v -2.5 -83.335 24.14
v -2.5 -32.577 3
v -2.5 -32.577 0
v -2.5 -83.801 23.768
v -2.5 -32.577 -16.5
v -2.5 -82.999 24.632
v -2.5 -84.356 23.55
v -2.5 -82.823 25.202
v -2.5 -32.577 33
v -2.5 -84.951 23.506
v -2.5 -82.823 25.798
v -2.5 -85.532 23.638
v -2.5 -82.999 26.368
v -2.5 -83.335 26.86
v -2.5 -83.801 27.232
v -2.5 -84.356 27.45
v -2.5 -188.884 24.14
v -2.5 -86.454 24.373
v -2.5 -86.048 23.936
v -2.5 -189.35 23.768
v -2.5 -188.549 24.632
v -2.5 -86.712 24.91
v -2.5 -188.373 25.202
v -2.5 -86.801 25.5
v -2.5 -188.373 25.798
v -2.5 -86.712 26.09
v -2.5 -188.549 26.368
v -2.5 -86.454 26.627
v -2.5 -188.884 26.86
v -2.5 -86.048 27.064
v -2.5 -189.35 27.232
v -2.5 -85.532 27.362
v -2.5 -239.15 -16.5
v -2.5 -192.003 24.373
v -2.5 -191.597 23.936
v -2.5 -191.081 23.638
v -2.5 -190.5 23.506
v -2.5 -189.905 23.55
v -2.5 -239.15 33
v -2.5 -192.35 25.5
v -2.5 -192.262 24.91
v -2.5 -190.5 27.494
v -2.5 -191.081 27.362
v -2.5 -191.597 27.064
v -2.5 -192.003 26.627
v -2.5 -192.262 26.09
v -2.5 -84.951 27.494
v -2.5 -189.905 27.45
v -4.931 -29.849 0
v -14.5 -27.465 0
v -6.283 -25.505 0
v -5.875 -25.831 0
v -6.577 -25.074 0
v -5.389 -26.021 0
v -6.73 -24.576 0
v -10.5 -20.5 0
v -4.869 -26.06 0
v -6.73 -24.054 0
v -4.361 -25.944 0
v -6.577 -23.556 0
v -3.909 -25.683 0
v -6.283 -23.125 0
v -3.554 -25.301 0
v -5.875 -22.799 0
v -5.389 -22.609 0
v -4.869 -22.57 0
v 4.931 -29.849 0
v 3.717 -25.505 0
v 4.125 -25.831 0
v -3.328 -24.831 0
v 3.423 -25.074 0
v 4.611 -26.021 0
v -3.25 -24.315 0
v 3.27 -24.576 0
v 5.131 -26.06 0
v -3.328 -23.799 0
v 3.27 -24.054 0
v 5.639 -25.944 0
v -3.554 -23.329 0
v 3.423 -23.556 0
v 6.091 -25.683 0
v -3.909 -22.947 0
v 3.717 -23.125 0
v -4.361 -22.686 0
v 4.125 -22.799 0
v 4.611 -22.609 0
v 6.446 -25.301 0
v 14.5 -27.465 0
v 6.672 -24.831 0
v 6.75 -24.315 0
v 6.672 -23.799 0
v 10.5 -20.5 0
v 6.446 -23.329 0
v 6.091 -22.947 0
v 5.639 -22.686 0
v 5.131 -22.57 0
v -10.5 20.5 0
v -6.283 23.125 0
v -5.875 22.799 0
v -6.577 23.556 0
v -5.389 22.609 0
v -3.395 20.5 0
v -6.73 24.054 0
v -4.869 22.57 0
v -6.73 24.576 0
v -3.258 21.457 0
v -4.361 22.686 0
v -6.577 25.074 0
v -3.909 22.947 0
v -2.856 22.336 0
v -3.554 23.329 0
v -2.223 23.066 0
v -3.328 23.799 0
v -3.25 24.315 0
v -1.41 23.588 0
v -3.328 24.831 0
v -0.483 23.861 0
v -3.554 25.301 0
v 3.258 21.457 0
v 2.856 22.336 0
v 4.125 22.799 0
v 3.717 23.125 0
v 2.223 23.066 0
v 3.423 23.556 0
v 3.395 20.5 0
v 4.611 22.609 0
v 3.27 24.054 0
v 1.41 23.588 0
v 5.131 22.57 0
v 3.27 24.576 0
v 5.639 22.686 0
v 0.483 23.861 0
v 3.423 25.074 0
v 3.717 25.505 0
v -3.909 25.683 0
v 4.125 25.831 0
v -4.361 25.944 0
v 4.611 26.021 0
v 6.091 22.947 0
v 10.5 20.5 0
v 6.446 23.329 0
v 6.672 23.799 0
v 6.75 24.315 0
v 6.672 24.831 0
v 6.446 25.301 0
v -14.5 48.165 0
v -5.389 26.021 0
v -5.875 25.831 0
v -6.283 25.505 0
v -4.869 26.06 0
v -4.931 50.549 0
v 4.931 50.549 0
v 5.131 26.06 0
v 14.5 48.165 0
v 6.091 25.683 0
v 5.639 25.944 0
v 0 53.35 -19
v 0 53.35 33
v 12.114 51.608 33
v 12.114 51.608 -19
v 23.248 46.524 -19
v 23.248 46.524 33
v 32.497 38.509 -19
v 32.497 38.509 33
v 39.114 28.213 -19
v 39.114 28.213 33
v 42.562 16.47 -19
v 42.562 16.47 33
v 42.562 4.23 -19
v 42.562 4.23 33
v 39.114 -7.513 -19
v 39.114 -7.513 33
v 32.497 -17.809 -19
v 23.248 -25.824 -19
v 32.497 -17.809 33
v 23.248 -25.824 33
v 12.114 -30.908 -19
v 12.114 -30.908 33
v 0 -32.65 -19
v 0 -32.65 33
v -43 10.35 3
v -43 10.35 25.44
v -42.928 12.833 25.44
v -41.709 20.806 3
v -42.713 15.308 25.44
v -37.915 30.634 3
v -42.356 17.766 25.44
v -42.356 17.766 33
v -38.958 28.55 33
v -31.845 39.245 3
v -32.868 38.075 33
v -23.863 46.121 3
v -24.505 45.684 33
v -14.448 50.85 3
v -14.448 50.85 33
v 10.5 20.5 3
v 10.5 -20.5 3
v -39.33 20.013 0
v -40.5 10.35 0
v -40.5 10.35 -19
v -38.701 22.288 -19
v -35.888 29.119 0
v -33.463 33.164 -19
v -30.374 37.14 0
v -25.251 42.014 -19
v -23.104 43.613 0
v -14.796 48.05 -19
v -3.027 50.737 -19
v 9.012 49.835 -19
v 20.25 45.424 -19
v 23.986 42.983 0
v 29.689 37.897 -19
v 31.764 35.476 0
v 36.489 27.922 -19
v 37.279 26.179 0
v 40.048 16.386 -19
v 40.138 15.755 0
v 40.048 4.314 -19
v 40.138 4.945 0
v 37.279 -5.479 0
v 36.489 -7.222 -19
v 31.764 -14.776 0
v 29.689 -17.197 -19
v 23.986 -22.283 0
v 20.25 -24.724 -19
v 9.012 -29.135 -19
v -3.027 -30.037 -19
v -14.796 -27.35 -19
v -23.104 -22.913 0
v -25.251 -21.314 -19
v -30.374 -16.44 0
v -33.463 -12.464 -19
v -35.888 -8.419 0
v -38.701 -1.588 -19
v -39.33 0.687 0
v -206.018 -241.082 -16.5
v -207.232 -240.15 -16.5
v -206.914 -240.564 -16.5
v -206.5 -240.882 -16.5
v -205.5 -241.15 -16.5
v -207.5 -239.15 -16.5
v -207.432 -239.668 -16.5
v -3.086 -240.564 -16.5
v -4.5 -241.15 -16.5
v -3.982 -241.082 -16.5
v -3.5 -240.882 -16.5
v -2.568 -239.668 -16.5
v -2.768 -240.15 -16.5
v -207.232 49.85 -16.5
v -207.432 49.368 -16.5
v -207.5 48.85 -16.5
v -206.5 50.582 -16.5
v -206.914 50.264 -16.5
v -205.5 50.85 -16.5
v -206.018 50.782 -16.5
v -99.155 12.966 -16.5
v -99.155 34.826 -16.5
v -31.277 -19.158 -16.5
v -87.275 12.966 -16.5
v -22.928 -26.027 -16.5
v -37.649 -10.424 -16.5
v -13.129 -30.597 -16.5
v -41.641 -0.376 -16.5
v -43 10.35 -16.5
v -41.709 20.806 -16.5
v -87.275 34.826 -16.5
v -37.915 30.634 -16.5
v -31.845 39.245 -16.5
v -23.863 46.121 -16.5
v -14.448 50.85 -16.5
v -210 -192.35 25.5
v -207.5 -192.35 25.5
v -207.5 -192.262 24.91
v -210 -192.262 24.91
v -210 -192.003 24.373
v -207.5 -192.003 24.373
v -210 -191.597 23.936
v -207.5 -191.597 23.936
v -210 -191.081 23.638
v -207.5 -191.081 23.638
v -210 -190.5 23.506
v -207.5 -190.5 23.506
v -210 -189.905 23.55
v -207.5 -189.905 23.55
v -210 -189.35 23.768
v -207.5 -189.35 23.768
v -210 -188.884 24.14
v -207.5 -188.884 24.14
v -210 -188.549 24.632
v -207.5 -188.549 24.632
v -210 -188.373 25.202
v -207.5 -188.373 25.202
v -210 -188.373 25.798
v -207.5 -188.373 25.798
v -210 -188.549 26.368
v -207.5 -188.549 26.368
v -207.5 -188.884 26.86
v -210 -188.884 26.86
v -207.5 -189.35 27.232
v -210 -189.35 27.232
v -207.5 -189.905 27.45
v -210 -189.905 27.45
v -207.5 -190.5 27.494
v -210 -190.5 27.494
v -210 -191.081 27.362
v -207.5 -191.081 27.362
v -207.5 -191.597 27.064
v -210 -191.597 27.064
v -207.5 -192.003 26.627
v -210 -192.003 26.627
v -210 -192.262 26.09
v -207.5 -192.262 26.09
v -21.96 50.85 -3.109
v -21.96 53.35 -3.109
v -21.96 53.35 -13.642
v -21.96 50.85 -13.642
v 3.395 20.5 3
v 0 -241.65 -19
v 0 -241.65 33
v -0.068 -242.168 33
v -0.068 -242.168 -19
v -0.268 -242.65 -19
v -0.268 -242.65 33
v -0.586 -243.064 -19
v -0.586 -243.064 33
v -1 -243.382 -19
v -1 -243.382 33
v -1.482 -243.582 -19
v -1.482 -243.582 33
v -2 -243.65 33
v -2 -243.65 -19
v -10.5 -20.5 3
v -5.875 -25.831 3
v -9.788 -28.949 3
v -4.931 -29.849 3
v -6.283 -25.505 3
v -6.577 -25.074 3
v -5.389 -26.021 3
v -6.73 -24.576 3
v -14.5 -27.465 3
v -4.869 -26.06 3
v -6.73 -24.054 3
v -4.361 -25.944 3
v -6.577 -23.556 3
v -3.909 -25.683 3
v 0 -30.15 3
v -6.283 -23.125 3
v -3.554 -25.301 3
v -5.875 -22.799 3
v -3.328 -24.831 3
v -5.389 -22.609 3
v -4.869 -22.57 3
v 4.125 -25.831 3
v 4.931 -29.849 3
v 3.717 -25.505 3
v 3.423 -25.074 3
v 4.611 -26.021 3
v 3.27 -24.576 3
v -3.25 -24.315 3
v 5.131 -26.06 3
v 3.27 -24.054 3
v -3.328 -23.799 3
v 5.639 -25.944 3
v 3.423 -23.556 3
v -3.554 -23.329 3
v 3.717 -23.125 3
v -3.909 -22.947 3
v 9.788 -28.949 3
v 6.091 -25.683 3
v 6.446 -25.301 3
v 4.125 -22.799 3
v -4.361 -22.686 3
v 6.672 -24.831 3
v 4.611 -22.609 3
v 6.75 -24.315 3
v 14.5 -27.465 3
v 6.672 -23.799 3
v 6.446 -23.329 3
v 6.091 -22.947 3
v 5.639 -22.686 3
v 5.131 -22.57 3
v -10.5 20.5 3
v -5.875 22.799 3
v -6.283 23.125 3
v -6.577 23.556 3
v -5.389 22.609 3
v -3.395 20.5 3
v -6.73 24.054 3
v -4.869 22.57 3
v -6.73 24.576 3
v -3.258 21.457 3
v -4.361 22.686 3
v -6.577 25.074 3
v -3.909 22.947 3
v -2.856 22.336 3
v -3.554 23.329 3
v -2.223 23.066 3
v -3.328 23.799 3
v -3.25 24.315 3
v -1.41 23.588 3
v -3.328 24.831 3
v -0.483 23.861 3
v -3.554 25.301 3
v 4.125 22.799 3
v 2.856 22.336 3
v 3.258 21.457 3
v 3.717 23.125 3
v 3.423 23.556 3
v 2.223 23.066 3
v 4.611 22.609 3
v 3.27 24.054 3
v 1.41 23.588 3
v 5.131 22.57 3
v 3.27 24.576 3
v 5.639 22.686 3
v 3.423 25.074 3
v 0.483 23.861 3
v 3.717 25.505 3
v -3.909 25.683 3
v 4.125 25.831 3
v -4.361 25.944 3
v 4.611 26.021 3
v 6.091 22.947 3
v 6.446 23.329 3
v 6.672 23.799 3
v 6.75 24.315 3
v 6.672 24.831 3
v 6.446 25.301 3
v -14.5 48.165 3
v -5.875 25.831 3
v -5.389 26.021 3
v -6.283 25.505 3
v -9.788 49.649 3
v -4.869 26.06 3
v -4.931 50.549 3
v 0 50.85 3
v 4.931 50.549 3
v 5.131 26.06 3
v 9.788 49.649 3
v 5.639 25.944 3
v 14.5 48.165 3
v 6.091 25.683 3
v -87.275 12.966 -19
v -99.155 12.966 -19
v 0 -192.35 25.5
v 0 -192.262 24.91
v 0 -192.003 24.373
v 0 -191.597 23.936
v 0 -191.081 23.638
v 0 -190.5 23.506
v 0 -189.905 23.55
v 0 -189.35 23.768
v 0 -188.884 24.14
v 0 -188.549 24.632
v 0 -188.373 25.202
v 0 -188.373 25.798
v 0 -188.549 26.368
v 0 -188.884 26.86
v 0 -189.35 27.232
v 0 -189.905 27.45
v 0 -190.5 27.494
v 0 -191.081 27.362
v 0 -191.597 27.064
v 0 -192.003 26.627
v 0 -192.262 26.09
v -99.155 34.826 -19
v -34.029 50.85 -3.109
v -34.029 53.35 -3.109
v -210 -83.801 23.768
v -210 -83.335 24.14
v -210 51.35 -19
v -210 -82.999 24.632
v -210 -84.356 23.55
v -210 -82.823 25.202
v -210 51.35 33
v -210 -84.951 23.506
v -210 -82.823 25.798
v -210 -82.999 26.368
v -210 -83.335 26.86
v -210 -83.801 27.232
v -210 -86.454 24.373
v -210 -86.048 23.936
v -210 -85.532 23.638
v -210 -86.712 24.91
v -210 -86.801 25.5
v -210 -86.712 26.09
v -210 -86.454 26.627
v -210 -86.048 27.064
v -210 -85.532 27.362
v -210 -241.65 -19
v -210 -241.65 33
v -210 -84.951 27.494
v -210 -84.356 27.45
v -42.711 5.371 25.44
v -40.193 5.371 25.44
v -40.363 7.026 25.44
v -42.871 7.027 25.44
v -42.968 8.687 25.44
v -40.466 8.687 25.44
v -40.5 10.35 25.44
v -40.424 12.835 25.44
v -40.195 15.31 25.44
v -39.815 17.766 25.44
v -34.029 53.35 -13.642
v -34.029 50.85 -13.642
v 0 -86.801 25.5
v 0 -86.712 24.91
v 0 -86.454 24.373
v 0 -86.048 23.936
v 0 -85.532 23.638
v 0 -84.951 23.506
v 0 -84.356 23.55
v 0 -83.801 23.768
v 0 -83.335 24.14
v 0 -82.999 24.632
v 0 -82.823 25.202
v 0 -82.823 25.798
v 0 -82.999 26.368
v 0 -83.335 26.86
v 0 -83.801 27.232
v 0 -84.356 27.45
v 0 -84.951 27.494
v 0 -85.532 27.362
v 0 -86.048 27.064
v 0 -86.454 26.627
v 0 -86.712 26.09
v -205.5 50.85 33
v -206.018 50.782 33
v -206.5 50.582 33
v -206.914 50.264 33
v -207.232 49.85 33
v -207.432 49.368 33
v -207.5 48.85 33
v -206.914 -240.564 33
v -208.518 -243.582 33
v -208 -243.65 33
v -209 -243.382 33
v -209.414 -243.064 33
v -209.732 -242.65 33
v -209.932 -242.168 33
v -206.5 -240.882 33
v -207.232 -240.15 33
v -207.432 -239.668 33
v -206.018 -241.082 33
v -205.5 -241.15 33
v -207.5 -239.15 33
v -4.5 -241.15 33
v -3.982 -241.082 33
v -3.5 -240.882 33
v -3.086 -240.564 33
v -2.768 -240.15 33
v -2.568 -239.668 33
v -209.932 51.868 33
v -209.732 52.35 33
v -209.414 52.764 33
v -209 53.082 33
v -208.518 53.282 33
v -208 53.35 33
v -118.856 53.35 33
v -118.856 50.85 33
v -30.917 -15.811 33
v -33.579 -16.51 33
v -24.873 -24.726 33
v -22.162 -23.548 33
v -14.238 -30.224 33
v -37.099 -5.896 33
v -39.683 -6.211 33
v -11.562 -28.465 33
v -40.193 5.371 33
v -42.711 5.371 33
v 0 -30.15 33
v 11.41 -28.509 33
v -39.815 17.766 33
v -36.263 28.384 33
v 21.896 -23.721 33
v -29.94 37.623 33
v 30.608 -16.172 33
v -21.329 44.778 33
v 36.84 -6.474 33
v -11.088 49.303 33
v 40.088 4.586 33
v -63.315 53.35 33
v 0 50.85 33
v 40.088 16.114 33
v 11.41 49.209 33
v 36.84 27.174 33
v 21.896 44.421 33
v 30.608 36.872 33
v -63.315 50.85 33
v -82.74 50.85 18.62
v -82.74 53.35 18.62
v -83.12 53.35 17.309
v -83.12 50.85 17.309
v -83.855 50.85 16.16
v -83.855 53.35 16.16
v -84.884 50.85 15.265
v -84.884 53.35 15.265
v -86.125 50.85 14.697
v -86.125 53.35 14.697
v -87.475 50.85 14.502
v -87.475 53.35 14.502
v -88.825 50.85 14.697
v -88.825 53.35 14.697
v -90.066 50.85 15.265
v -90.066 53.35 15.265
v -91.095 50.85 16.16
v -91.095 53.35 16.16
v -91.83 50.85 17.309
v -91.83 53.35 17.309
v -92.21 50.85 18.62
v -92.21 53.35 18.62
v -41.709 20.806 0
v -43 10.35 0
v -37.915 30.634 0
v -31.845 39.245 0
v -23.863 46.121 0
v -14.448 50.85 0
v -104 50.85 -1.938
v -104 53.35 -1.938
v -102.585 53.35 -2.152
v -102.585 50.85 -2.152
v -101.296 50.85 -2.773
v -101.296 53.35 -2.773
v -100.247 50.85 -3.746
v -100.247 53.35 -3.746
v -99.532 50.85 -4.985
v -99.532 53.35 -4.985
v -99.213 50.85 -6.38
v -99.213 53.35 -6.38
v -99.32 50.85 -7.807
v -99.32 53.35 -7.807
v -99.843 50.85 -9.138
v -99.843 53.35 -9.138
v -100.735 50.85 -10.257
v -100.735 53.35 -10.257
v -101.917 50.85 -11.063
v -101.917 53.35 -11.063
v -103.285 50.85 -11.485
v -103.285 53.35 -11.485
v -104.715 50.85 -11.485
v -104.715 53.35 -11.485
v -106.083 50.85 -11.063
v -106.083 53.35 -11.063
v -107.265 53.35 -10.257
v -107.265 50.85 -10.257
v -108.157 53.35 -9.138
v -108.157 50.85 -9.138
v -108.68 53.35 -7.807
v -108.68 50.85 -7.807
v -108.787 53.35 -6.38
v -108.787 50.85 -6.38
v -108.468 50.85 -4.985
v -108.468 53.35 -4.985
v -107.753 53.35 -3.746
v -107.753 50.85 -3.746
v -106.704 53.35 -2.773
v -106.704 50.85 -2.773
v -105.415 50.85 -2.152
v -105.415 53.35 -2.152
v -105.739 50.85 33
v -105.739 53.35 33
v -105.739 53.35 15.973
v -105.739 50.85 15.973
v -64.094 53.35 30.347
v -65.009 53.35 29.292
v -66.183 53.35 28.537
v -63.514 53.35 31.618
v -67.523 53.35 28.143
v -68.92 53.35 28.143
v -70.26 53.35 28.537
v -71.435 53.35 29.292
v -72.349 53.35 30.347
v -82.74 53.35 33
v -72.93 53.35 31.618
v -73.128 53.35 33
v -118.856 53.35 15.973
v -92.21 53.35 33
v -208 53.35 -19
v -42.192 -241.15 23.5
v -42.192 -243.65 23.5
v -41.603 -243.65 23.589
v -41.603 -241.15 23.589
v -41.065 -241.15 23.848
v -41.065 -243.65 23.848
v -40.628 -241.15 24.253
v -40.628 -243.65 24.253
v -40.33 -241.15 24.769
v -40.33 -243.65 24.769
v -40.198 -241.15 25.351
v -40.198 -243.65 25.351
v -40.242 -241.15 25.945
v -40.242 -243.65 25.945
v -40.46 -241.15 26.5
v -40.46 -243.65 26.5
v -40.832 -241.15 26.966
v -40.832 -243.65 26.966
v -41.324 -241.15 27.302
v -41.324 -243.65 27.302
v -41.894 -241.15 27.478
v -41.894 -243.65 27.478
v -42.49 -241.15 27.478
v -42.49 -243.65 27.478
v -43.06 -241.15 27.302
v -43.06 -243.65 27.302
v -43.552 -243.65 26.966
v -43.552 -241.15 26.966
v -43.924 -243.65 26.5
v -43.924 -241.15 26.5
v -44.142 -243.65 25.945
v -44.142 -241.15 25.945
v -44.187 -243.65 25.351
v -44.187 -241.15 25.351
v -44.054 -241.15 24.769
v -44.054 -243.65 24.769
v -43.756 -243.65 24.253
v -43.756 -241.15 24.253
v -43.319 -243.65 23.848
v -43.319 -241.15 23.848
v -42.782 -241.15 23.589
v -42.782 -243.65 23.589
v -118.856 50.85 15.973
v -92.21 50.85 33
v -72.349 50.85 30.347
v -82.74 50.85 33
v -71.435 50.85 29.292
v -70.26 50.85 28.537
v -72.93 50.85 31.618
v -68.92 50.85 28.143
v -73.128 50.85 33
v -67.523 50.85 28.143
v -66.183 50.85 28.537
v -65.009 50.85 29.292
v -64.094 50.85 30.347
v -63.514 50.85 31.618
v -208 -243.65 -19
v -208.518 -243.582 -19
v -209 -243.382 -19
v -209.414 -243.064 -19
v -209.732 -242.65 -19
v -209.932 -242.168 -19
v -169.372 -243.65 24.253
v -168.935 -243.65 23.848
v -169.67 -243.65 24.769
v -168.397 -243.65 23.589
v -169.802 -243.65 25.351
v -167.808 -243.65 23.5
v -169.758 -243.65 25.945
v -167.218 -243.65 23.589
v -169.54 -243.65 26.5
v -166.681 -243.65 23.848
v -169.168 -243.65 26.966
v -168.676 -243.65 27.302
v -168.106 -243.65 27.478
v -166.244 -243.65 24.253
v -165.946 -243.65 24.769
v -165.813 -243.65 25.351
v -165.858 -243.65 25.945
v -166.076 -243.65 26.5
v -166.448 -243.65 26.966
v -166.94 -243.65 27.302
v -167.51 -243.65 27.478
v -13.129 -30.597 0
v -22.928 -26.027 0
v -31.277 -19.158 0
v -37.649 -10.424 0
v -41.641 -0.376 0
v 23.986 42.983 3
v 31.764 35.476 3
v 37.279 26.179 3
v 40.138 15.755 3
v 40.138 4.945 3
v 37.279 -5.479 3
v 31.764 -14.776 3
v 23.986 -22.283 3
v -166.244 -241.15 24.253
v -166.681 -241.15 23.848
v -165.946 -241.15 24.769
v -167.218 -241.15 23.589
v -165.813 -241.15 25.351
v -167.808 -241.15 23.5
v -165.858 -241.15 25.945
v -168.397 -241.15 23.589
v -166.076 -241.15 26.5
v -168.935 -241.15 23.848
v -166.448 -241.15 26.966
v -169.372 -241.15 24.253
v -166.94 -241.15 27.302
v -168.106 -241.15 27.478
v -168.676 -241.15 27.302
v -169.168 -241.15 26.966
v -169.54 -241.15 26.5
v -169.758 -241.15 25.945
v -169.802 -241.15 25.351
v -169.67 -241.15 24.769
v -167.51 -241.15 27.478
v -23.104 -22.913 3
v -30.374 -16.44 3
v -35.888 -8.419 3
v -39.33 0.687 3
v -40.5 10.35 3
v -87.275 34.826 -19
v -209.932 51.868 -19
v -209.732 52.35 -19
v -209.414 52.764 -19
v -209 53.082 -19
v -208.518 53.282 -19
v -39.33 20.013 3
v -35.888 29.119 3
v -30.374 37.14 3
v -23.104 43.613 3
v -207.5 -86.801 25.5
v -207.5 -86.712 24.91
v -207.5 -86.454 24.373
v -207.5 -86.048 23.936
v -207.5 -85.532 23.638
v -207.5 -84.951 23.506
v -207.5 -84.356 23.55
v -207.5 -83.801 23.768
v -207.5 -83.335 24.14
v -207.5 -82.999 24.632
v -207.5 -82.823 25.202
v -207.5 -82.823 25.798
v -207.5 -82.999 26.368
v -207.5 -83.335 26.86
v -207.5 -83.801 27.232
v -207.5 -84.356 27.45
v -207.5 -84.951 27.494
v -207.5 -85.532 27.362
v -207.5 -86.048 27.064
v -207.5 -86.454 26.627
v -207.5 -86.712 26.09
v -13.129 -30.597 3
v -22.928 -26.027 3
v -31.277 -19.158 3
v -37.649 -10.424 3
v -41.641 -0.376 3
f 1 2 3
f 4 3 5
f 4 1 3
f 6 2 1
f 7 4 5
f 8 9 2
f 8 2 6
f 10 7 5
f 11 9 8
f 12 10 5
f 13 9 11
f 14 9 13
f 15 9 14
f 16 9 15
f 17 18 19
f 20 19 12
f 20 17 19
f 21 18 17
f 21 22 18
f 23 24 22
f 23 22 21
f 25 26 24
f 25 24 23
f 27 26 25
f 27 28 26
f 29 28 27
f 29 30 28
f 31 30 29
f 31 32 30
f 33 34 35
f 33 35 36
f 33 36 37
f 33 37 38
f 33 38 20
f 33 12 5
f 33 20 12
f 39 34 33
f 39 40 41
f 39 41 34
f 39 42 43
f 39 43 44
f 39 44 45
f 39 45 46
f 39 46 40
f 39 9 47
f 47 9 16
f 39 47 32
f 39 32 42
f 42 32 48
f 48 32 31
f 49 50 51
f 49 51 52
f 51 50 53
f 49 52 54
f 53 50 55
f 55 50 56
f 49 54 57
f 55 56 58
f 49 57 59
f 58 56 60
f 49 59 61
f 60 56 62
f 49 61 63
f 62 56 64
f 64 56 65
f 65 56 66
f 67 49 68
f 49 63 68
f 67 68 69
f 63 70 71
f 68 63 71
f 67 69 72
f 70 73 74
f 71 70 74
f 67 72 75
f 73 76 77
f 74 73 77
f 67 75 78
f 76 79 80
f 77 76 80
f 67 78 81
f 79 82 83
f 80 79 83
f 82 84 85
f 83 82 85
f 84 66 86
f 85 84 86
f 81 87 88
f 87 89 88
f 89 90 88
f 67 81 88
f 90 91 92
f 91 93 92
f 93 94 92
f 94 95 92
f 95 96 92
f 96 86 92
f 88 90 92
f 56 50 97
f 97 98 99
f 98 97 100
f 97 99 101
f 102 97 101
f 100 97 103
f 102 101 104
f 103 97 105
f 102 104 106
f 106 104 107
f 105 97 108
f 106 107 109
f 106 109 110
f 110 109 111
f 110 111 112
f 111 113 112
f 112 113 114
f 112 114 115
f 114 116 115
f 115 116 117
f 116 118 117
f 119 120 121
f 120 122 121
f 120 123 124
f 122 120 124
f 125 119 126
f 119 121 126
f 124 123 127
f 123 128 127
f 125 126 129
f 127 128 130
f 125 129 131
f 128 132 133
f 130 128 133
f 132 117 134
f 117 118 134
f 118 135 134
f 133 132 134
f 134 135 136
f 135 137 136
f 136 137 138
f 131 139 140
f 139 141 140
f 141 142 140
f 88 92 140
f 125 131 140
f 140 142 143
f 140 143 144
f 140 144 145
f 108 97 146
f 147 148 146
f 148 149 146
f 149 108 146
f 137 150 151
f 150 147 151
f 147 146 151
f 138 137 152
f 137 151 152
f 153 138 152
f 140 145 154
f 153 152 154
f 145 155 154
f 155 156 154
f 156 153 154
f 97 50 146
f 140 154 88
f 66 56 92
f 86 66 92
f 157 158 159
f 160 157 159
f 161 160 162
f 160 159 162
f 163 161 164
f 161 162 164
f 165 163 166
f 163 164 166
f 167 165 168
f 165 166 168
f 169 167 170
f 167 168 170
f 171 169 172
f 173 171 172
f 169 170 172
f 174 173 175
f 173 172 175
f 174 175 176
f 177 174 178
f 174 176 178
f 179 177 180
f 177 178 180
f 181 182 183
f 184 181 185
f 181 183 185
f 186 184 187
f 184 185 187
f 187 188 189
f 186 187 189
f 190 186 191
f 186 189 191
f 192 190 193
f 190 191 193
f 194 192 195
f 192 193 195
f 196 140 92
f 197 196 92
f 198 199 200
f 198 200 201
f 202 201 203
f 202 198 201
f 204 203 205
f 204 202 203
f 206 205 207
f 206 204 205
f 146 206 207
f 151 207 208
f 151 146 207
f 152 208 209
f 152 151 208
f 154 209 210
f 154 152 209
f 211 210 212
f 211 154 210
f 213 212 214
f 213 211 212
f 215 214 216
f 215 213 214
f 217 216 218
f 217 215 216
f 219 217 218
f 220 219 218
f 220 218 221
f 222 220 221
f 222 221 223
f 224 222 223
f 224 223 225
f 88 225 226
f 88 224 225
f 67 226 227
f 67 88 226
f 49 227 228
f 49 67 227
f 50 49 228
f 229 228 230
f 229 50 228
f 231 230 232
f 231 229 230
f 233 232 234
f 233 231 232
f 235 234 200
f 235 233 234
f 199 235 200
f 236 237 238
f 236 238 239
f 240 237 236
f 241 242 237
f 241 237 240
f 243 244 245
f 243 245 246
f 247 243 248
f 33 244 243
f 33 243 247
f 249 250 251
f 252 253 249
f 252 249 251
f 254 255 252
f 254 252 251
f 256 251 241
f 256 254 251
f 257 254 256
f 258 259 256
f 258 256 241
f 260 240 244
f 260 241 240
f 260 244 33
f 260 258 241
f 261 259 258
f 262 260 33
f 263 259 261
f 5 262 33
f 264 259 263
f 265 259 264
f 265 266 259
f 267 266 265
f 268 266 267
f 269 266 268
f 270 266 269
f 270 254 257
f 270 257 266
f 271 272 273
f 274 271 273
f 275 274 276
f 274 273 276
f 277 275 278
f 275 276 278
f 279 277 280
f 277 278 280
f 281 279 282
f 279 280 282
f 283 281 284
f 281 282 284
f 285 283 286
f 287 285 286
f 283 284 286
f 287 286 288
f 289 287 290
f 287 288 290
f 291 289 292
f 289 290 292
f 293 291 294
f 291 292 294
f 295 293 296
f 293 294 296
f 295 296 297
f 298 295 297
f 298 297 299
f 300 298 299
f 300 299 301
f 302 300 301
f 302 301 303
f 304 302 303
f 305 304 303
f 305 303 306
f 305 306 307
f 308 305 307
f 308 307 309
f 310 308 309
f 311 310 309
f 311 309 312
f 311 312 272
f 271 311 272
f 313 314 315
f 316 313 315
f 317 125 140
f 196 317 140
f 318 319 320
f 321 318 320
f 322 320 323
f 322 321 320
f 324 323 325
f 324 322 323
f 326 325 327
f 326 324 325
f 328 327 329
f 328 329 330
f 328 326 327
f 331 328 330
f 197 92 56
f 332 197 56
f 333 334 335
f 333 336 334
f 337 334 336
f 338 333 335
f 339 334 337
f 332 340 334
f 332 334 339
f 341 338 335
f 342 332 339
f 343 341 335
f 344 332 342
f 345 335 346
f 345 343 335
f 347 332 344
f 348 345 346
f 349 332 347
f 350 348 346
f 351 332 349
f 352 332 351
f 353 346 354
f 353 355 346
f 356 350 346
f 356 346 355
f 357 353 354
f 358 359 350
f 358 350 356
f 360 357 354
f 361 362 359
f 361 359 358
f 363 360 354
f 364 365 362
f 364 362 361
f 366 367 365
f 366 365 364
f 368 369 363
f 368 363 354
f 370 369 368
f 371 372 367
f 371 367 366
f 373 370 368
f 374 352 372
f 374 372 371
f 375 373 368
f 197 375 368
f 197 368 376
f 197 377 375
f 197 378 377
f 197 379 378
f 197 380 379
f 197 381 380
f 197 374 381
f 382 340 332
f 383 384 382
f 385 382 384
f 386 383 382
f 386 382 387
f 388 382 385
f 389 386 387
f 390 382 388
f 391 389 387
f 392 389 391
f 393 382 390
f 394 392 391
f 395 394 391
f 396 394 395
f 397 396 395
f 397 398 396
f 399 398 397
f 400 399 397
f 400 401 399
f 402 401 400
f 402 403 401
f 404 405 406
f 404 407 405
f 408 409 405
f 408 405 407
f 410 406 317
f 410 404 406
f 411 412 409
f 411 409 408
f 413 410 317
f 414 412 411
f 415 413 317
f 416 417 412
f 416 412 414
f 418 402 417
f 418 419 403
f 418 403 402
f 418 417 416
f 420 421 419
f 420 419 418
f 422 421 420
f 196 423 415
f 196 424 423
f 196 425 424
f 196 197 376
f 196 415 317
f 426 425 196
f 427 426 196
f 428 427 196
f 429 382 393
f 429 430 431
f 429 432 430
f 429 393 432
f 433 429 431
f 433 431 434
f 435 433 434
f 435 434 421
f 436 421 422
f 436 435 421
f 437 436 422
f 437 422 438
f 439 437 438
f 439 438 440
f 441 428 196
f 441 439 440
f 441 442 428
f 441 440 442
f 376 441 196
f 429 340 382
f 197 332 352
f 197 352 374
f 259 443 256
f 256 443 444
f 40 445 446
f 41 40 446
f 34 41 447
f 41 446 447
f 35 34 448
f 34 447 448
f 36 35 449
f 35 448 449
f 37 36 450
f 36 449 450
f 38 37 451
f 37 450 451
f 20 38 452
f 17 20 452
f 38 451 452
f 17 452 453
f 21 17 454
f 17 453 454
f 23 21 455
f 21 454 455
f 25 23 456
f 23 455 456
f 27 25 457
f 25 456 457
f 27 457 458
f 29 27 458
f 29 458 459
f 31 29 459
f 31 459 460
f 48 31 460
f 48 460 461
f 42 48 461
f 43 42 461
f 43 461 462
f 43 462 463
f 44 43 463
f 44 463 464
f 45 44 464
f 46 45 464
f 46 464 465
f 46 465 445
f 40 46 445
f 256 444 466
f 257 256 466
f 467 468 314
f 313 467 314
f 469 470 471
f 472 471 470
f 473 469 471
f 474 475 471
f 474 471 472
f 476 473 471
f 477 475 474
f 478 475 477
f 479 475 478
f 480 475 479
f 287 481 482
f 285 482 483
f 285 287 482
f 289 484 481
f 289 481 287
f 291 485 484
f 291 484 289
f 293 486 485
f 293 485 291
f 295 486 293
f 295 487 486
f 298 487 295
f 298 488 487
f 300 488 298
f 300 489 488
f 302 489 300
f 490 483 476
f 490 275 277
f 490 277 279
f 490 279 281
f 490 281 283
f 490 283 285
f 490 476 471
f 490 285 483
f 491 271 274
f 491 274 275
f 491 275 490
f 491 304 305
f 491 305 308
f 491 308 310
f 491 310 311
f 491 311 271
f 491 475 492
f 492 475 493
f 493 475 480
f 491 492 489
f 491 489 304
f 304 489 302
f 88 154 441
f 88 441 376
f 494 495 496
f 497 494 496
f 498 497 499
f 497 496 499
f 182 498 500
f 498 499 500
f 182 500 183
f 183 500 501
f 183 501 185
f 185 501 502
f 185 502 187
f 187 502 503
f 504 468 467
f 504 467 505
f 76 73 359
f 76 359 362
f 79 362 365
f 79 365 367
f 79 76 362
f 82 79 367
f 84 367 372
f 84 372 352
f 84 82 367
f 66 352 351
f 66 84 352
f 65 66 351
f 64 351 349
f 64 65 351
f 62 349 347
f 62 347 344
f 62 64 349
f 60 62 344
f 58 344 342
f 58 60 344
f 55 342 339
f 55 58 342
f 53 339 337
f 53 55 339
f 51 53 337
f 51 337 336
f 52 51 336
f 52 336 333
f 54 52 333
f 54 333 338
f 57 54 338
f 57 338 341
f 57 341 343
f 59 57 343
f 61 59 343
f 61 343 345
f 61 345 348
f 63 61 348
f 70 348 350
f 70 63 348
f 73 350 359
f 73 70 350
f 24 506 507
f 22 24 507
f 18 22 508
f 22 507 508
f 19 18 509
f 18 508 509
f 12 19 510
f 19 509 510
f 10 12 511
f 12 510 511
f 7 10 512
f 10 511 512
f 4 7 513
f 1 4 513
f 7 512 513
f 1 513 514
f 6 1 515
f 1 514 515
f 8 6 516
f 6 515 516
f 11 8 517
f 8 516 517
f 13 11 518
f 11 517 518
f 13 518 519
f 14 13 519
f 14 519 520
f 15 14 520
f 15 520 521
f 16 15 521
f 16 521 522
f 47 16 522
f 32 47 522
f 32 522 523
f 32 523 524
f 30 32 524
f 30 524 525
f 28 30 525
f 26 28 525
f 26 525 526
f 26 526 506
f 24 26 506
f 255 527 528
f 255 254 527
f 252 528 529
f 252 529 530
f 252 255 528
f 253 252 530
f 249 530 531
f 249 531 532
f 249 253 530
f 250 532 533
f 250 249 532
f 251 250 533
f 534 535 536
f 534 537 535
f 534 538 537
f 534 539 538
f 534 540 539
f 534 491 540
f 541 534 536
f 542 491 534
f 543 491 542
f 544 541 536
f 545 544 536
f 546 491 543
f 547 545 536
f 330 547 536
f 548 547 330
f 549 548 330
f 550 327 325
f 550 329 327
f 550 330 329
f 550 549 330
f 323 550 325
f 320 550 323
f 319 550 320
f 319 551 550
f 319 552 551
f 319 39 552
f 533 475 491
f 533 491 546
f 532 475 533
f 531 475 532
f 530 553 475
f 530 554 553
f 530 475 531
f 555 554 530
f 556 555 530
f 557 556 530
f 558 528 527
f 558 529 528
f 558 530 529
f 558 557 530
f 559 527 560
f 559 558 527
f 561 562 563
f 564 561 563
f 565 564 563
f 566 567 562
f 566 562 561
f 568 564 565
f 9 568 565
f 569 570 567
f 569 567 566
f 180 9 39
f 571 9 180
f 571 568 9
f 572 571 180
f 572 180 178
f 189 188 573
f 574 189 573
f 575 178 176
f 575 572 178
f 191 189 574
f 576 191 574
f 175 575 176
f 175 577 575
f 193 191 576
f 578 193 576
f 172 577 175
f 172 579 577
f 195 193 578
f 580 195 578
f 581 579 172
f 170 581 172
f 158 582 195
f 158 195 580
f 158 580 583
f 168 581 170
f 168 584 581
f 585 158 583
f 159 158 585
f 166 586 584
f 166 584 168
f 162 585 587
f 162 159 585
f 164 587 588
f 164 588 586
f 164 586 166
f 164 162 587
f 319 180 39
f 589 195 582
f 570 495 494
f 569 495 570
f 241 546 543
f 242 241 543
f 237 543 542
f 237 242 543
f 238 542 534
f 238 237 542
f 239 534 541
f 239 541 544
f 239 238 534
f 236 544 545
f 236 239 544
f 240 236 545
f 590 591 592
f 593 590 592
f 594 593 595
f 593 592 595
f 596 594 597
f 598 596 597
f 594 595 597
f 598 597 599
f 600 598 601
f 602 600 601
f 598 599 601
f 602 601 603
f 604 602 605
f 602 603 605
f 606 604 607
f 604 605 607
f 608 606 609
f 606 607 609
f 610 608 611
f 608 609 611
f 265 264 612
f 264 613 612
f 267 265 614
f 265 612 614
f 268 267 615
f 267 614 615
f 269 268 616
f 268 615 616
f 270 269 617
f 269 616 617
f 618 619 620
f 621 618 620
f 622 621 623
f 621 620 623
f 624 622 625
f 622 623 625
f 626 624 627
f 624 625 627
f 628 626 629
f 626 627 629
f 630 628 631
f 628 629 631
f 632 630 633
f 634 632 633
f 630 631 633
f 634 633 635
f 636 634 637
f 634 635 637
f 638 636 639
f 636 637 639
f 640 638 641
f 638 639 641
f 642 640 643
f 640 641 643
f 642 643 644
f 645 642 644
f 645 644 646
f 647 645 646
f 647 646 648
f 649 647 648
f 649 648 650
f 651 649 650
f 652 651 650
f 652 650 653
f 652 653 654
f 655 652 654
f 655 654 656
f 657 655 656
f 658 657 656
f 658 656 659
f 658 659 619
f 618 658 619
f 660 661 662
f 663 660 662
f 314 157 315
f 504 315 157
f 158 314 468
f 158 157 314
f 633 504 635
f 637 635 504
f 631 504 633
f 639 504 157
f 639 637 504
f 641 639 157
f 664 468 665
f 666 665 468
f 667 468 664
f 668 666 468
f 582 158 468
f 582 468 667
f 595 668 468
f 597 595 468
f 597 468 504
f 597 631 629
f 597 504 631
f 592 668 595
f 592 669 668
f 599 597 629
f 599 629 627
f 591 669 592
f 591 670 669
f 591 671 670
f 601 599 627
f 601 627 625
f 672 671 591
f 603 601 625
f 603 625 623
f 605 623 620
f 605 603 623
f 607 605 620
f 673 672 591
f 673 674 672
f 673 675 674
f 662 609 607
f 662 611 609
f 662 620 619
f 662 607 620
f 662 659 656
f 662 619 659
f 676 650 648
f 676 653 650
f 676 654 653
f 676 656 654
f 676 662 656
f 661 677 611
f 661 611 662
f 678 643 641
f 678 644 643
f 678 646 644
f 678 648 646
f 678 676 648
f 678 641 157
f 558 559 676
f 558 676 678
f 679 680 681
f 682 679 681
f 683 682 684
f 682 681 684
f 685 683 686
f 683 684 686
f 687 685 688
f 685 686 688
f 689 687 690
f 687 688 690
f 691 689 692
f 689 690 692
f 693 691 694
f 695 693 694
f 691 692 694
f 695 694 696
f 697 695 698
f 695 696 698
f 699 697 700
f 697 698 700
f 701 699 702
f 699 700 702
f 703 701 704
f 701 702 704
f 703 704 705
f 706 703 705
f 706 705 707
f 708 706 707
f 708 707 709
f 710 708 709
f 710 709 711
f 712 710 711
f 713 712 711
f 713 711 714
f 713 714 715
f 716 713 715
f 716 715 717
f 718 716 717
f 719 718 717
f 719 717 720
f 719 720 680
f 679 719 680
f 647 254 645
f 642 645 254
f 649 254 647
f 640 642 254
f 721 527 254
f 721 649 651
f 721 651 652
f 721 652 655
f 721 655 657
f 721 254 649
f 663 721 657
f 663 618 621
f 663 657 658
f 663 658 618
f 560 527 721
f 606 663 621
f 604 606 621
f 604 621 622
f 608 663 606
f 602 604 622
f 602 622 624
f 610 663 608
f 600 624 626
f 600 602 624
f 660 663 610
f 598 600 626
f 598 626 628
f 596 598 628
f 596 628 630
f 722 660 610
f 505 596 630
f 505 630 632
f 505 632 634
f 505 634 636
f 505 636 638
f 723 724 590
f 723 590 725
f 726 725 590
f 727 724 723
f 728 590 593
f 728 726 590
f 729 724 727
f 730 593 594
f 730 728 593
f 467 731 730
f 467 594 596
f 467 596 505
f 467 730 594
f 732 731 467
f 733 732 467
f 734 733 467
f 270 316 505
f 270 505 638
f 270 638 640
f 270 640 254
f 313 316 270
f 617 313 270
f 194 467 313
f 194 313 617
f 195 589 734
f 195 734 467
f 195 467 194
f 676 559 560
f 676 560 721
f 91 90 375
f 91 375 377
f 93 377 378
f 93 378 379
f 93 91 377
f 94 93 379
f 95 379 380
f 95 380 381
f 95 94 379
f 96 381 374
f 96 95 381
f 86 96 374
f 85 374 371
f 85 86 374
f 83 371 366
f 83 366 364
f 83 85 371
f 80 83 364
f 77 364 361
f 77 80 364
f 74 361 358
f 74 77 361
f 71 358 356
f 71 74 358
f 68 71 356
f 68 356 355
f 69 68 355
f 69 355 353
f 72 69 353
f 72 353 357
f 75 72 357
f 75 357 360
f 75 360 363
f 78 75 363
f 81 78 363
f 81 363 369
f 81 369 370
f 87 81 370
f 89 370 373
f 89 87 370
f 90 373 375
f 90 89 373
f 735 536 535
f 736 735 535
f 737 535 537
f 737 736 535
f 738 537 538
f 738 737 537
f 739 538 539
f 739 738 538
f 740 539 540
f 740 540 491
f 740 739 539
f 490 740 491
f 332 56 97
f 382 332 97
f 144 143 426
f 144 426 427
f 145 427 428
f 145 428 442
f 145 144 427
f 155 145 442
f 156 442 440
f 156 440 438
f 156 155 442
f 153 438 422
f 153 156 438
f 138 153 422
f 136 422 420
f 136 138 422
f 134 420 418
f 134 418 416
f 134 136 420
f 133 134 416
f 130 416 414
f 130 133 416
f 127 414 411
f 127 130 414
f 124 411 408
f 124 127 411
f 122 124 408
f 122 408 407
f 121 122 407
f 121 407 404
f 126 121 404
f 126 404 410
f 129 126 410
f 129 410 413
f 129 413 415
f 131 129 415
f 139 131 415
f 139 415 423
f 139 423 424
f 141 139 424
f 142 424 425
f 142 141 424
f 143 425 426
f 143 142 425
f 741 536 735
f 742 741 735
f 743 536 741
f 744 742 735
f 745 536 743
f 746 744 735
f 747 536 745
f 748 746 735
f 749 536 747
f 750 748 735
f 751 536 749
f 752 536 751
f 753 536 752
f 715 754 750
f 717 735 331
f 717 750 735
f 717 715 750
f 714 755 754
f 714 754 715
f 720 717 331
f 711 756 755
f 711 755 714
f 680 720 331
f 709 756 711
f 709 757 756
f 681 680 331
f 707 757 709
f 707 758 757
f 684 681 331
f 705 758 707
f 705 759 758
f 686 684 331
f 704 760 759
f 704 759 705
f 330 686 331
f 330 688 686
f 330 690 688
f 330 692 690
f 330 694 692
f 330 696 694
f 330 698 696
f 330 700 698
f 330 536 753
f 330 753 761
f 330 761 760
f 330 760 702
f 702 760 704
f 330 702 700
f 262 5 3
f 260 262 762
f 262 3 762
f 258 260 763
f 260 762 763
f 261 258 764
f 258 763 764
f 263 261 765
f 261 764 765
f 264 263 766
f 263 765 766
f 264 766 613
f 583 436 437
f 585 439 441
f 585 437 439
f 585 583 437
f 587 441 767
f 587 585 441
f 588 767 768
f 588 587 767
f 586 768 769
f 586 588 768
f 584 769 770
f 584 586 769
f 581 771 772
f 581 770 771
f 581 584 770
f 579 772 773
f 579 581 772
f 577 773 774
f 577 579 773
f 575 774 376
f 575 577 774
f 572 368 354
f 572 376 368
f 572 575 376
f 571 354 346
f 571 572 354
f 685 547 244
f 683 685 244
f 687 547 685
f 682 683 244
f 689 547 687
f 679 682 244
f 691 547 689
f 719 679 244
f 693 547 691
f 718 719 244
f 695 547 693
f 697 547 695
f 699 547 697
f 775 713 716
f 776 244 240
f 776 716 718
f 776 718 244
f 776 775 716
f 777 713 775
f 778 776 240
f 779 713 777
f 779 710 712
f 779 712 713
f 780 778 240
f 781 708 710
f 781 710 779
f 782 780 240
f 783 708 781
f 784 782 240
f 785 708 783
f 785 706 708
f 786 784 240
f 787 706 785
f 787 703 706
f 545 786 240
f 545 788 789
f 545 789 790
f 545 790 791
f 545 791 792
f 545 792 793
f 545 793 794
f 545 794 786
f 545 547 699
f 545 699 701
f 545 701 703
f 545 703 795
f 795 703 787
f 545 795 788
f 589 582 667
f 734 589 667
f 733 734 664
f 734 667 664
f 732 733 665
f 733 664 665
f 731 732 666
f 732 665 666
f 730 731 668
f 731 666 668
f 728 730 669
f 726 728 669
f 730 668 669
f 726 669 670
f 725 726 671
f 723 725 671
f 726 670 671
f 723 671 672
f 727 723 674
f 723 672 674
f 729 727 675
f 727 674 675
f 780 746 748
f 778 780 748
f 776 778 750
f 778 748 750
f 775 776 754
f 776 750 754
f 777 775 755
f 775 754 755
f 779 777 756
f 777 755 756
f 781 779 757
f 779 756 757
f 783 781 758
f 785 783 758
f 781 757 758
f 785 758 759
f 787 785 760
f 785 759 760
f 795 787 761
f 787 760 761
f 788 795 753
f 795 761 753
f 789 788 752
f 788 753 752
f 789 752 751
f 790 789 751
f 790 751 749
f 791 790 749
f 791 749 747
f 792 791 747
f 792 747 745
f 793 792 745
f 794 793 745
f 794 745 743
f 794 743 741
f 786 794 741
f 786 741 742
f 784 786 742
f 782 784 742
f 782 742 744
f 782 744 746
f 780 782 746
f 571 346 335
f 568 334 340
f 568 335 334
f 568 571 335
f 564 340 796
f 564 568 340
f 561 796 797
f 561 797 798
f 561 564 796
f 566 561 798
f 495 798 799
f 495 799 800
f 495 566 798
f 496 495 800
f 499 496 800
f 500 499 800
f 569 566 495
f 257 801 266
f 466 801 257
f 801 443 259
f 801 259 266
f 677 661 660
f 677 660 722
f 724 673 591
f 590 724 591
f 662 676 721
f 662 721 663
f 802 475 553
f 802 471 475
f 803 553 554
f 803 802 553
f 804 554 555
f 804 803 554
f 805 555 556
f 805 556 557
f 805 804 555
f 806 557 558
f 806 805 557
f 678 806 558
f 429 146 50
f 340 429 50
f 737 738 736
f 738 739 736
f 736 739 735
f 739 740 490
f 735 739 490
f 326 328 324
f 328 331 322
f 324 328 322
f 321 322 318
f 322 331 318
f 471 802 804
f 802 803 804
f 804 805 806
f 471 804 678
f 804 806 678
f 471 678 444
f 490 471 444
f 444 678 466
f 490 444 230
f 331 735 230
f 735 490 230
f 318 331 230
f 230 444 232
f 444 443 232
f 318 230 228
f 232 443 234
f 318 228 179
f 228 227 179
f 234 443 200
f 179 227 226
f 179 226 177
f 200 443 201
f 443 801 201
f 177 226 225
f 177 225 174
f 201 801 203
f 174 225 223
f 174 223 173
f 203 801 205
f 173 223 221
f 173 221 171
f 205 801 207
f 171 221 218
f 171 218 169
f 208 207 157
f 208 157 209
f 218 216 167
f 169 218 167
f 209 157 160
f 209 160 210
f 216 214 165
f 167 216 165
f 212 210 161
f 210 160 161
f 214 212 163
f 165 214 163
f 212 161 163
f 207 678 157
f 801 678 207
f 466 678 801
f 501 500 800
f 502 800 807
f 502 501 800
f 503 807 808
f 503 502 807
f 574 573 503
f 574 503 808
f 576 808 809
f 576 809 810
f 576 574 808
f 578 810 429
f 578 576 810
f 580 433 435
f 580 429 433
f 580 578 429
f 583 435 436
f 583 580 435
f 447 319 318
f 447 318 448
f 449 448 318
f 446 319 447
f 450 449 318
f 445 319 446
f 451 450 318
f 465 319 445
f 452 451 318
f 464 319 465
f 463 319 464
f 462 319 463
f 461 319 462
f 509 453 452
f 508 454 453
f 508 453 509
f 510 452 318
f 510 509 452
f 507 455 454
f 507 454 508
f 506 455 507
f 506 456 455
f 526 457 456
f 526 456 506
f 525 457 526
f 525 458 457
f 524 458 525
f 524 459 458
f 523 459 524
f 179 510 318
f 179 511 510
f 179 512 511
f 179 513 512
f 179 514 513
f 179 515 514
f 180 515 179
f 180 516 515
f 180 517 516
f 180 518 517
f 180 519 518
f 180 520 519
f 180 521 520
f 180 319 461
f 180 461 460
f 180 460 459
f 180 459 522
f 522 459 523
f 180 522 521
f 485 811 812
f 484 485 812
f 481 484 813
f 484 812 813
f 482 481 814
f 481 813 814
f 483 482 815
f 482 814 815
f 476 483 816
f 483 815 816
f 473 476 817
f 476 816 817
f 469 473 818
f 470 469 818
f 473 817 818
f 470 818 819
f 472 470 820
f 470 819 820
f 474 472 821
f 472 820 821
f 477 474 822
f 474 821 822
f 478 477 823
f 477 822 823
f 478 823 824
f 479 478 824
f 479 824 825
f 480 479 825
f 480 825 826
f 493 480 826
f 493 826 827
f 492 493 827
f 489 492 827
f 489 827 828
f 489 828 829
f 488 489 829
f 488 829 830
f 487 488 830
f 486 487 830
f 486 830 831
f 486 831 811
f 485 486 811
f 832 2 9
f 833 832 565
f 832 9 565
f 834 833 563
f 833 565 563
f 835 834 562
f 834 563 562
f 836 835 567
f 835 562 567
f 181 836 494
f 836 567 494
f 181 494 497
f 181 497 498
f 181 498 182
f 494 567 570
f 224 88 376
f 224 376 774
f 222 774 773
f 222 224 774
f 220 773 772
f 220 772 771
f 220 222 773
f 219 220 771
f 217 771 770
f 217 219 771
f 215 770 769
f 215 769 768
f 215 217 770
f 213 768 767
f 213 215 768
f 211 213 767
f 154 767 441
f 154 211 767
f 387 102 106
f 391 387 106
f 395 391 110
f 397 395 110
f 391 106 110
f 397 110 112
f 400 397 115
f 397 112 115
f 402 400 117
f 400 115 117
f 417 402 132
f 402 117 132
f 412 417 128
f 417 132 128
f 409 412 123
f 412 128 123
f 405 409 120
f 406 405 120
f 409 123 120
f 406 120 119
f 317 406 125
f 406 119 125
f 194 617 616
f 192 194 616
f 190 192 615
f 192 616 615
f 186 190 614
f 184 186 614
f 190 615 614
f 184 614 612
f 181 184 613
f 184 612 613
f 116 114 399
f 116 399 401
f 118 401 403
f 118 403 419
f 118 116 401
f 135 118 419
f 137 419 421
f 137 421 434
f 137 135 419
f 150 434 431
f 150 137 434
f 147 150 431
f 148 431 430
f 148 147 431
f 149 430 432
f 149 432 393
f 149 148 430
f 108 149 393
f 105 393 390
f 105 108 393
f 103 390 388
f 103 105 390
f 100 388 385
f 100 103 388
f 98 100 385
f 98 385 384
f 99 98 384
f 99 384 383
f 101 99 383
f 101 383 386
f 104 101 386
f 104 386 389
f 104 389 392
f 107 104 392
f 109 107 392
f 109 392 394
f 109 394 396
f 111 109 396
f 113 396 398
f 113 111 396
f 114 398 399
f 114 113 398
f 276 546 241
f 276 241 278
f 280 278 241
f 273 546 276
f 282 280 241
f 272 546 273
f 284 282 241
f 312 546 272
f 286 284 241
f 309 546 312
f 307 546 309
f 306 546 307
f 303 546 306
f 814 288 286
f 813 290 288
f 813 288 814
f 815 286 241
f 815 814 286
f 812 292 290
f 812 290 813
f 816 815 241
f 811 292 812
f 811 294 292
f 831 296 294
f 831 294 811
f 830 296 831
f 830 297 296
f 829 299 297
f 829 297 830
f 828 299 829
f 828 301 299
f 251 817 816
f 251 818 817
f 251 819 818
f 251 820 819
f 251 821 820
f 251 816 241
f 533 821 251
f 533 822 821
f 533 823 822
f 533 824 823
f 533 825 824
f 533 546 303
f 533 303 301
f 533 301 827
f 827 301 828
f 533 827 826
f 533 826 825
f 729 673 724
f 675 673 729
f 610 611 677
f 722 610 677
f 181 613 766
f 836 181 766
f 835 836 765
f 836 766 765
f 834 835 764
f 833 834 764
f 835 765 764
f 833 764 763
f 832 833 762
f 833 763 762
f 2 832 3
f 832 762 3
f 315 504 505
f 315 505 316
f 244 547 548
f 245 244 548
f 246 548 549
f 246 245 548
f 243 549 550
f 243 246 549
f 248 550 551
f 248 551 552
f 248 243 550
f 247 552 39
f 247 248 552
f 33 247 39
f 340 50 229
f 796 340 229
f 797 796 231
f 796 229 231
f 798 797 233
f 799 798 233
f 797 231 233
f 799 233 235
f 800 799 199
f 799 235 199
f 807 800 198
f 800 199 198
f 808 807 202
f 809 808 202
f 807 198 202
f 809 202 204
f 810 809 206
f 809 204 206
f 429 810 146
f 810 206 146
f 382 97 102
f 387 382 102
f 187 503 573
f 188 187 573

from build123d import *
from build123d.topology import SkipClean

# Parameters (mm, degrees)
SKETCH_1_R             = 43
SKETCH_1_R_2           = 1.75
EXTRUDE_1_DEPTH        = 3
EXTRUDE_1_2_DEPTH      = 19
EXTRUDE_1_2_DEPTH_BACK = 33
SKETCH_3_R             = 43
SKETCH_3_R_2           = 40.5
EXTRUDE_START          = -52
EXTRUDE_2_DEPTH        = 52
EXTRUDE_2_2_DEPTH      = 2.5
FILLET_1_R             = 2
SKETCH_6_W             = 12.068691
SKETCH_6_H             = 10.532676
CUT_EXTRUDE_1_DEPTH    = 3
SKETCH_7_R             = 2
CUT_EXTRUDE_2_DEPTH    = 283
SKETCH_8_R             = 2
CUT_EXTRUDE_3_DEPTH    = 10
SKETCH_9_W             = 13.11693
SKETCH_9_H             = 19.719399
CUT_EXTRUDE_4_DEPTH    = 10
SKETCH_10_W            = 7.55958
SKETCH_10_H            = 12.395118
CUT_EXTRUDE_5_DEPTH    = 61
SKETCH_11_W            = 11.880057
SKETCH_11_H            = 21.859304
CUT_EXTRUDE_6_DEPTH    = 61
SKETCH_12_R            = 4.8
CUT_EXTRUDE_7_DEPTH    = 10
SKETCH_13_R            = 4.906551
CUT_EXTRUDE_8_DEPTH    = 10


with BuildPart() as part:
    # 草图1 → Extrude 1 (new body)
    with BuildSketch(Plane.XY):
        with Locations((0, 10.35)):
            Circle(SKETCH_1_R)
        with Locations((-5, 24.315)):
            Circle(SKETCH_1_R_2, mode=Mode.SUBTRACT)
        with Locations((5, 24.315)):
            Circle(SKETCH_1_R_2, mode=Mode.SUBTRACT)
        with Locations((-5, -24.315)):
            Circle(SKETCH_1_R_2, mode=Mode.SUBTRACT)
        with Locations((5, -24.315)):
            Circle(SKETCH_1_R_2, mode=Mode.SUBTRACT)
        with BuildLine():
            Line((3.395324, 20.5), (10.5, 20.5))
            Line((10.5, 20.5), (10.5, -20.5))
            Line((10.5, -20.5), (-10.5, -20.5))
            Line((-10.5, -20.5), (-10.5, 20.5))
            Line((-10.5, 20.5), (-3.395324, 20.5))
            ThreePointArc((-3.395324, 20.5), (0, 23.895324), (3.395324, 20.5))
        make_face(mode=Mode.SUBTRACT)
        with BuildLine():
            Line((-14.5, 48.165341), (-14.5, -27.465341))
            ThreePointArc((-14.5, -27.465341), (-40.5, 10.35), (-14.5, 48.165341))
        make_face(mode=Mode.SUBTRACT)
        with BuildLine():
            Line((14.5, 48.165341), (14.5, -27.465341))
            ThreePointArc((14.5, -27.465341), (40.5, 10.35), (14.5, 48.165341))
        make_face(mode=Mode.SUBTRACT)
    extrude(amount=EXTRUDE_1_DEPTH)

    # 草图3 → Extrude 1 2 (add, two sides: drawn at the far end of the back side and taken through both)
    with SkipClean():  # the faces are left unmerged after this step: merging them gives an invalid solid
        with BuildSketch(Plane(origin=(0, 0, 0), x_dir=(-1, 0, 0), z_dir=(0, 0, -1)).offset(-EXTRUDE_1_2_DEPTH_BACK)):
            with Locations((0, 10.35)):
                Circle(SKETCH_3_R)
            with Locations((0, 10.35)):
                Circle(SKETCH_3_R_2, mode=Mode.SUBTRACT)
        extrude(amount=EXTRUDE_1_2_DEPTH + EXTRUDE_1_2_DEPTH_BACK)

    # 草图4 → Extrude 2 (add)
    with SkipClean():  # the faces are left unmerged after this step: merging them gives an invalid solid
        with BuildSketch(Plane(origin=(0, 0, -19), x_dir=(-1, 0, 0), z_dir=(0, 0, -1)).offset(EXTRUDE_START)):
            Polygon((0, 53.35), (210, 53.35), (210, -243.65), (0, -243.65), (0, -30.15), (2.5, -30.15), (2.5, -241.15), (207.5, -241.15), (207.5, 50.85), (0, 50.85), align=None)
        extrude(amount=EXTRUDE_2_DEPTH)

    # 草图5 → Extrude 2 2 (add)
    with SkipClean():  # the faces are left unmerged after this step: merging them gives an invalid solid
        with BuildSketch(Plane(origin=(0, 0, -19), x_dir=(-1, 0, 0), z_dir=(0, 0, -1))):
            with BuildLine():
                Line((2.5, -241.15), (2.5, -32.577264))
                ThreePointArc((2.5, -32.577264), (42.565682, 4.25388), (14.448183, 50.85))
                Line((14.448183, 50.85), (207.5, 50.85))
                Line((207.5, 50.85), (207.5, -241.15))
                Line((207.5, -241.15), (2.5, -241.15))
            make_face()
        extrude(amount=-EXTRUDE_2_2_DEPTH)

    # 圆角1
    fillet_1_edges = [part.edges().sort_by_distance(p)[0] for p in [
        (-207.5, 50.85, 8.25),
        (0, -243.65, 7),
        (-207.5, -241.15, 8.25),
        (-2.5, -241.15, 8.25),
        (-210, -243.65, 7),
        (-210, 53.35, 7),
    ]]
    fillet(fillet_1_edges, radius=FILLET_1_R)

    # 草图6 → 切除-拉伸1 (cut)
    with BuildSketch(Plane(origin=(0, 53.35, 0), x_dir=(1, 0, 0), z_dir=(0, 1, 0))):
        with Locations((-27.994546, 8.375655)):
            Rectangle(SKETCH_6_W, SKETCH_6_H)
    extrude(amount=-CUT_EXTRUDE_1_DEPTH, mode=Mode.SUBTRACT)

    # 草图7 → 切除-拉伸2 (cut)
    with BuildSketch(Plane(origin=(0, 0, 0), x_dir=(0, 0, -1), z_dir=(1, 0, 0))):
        with Locations(Location((-25.5, -84.801057, 0), (0, 0, 270))):
            Circle(SKETCH_7_R)
        with Locations(Location((-25.5, -190.350496, 0), (0, 0, 270))):
            Circle(SKETCH_7_R)
    extrude(amount=-CUT_EXTRUDE_2_DEPTH, mode=Mode.SUBTRACT)

    # 草图8 → 切除-拉伸3 (cut)
    with BuildSketch(Plane.XZ.offset(243.65)):
        with Locations(Location((-167.807889, 25.5, 0), (0, 0, 270))):
            Circle(SKETCH_8_R)
        with Locations(Location((-42.192111, 25.5, 0), (0, 0, 270))):
            Circle(SKETCH_8_R)
    extrude(amount=-CUT_EXTRUDE_3_DEPTH, mode=Mode.SUBTRACT)

    # 草图9 → 切除-拉伸4 (cut)
    with BuildSketch(Plane(origin=(0, 53.35, 0), x_dir=(1, 0, 0), z_dir=(0, 1, 0))):
        with Locations((-112.297275, -25.832317)):
            Rectangle(SKETCH_9_W, SKETCH_9_H)
        with BuildLine():
            Line((-92.210137, -34.22374), (-82.740067, -34.22374))
            Line((-82.740067, -34.22374), (-82.740067, -18.619532))
            ThreePointArc((-82.740067, -18.619532), (-87.475102, -14.502019), (-92.210137, -18.619532))
            Line((-92.210137, -18.619532), (-92.210137, -34.22374))
        make_face()
    extrude(amount=-CUT_EXTRUDE_4_DEPTH, mode=Mode.SUBTRACT)

    # 草图10 → 切除-拉伸5 (cut)
    with BuildSketch(Plane.ZY.offset(2.5)):
        with Locations((29.22021, 11.568763)):
            Rectangle(SKETCH_10_W, SKETCH_10_H)
    extrude(amount=CUT_EXTRUDE_5_DEPTH, mode=Mode.SUBTRACT)

    # 草图11 → 切除-拉伸6 (cut)
    with BuildSketch(Plane(origin=(0, 0, -19), x_dir=(-1, 0, 0), z_dir=(0, 0, -1))):
        with Locations((93.214773, 23.896012)):
            Rectangle(SKETCH_11_W, SKETCH_11_H)
    extrude(amount=-CUT_EXTRUDE_6_DEPTH, mode=Mode.SUBTRACT)

    # 草图12 → 切除-拉伸7 (cut)
    with BuildSketch(Plane(origin=(0, 53.35, 0), x_dir=(1, 0, 0), z_dir=(0, 1, 0))):
        with Locations(Location((-104, 6.738484, 0), (0, 0, 270))):
            Circle(SKETCH_12_R)
    extrude(amount=-CUT_EXTRUDE_7_DEPTH, mode=Mode.SUBTRACT)

    # 草图13 → 切除-拉伸8 (cut)
    with BuildSketch(Plane(origin=(0, 53.35, 0), x_dir=(1, 0, 0), z_dir=(0, 1, 0))):
        with Locations((-68.22173, -33)):
            Circle(SKETCH_13_R)
    extrude(amount=-CUT_EXTRUDE_8_DEPTH, mode=Mode.SUBTRACT)


solid = part.part
